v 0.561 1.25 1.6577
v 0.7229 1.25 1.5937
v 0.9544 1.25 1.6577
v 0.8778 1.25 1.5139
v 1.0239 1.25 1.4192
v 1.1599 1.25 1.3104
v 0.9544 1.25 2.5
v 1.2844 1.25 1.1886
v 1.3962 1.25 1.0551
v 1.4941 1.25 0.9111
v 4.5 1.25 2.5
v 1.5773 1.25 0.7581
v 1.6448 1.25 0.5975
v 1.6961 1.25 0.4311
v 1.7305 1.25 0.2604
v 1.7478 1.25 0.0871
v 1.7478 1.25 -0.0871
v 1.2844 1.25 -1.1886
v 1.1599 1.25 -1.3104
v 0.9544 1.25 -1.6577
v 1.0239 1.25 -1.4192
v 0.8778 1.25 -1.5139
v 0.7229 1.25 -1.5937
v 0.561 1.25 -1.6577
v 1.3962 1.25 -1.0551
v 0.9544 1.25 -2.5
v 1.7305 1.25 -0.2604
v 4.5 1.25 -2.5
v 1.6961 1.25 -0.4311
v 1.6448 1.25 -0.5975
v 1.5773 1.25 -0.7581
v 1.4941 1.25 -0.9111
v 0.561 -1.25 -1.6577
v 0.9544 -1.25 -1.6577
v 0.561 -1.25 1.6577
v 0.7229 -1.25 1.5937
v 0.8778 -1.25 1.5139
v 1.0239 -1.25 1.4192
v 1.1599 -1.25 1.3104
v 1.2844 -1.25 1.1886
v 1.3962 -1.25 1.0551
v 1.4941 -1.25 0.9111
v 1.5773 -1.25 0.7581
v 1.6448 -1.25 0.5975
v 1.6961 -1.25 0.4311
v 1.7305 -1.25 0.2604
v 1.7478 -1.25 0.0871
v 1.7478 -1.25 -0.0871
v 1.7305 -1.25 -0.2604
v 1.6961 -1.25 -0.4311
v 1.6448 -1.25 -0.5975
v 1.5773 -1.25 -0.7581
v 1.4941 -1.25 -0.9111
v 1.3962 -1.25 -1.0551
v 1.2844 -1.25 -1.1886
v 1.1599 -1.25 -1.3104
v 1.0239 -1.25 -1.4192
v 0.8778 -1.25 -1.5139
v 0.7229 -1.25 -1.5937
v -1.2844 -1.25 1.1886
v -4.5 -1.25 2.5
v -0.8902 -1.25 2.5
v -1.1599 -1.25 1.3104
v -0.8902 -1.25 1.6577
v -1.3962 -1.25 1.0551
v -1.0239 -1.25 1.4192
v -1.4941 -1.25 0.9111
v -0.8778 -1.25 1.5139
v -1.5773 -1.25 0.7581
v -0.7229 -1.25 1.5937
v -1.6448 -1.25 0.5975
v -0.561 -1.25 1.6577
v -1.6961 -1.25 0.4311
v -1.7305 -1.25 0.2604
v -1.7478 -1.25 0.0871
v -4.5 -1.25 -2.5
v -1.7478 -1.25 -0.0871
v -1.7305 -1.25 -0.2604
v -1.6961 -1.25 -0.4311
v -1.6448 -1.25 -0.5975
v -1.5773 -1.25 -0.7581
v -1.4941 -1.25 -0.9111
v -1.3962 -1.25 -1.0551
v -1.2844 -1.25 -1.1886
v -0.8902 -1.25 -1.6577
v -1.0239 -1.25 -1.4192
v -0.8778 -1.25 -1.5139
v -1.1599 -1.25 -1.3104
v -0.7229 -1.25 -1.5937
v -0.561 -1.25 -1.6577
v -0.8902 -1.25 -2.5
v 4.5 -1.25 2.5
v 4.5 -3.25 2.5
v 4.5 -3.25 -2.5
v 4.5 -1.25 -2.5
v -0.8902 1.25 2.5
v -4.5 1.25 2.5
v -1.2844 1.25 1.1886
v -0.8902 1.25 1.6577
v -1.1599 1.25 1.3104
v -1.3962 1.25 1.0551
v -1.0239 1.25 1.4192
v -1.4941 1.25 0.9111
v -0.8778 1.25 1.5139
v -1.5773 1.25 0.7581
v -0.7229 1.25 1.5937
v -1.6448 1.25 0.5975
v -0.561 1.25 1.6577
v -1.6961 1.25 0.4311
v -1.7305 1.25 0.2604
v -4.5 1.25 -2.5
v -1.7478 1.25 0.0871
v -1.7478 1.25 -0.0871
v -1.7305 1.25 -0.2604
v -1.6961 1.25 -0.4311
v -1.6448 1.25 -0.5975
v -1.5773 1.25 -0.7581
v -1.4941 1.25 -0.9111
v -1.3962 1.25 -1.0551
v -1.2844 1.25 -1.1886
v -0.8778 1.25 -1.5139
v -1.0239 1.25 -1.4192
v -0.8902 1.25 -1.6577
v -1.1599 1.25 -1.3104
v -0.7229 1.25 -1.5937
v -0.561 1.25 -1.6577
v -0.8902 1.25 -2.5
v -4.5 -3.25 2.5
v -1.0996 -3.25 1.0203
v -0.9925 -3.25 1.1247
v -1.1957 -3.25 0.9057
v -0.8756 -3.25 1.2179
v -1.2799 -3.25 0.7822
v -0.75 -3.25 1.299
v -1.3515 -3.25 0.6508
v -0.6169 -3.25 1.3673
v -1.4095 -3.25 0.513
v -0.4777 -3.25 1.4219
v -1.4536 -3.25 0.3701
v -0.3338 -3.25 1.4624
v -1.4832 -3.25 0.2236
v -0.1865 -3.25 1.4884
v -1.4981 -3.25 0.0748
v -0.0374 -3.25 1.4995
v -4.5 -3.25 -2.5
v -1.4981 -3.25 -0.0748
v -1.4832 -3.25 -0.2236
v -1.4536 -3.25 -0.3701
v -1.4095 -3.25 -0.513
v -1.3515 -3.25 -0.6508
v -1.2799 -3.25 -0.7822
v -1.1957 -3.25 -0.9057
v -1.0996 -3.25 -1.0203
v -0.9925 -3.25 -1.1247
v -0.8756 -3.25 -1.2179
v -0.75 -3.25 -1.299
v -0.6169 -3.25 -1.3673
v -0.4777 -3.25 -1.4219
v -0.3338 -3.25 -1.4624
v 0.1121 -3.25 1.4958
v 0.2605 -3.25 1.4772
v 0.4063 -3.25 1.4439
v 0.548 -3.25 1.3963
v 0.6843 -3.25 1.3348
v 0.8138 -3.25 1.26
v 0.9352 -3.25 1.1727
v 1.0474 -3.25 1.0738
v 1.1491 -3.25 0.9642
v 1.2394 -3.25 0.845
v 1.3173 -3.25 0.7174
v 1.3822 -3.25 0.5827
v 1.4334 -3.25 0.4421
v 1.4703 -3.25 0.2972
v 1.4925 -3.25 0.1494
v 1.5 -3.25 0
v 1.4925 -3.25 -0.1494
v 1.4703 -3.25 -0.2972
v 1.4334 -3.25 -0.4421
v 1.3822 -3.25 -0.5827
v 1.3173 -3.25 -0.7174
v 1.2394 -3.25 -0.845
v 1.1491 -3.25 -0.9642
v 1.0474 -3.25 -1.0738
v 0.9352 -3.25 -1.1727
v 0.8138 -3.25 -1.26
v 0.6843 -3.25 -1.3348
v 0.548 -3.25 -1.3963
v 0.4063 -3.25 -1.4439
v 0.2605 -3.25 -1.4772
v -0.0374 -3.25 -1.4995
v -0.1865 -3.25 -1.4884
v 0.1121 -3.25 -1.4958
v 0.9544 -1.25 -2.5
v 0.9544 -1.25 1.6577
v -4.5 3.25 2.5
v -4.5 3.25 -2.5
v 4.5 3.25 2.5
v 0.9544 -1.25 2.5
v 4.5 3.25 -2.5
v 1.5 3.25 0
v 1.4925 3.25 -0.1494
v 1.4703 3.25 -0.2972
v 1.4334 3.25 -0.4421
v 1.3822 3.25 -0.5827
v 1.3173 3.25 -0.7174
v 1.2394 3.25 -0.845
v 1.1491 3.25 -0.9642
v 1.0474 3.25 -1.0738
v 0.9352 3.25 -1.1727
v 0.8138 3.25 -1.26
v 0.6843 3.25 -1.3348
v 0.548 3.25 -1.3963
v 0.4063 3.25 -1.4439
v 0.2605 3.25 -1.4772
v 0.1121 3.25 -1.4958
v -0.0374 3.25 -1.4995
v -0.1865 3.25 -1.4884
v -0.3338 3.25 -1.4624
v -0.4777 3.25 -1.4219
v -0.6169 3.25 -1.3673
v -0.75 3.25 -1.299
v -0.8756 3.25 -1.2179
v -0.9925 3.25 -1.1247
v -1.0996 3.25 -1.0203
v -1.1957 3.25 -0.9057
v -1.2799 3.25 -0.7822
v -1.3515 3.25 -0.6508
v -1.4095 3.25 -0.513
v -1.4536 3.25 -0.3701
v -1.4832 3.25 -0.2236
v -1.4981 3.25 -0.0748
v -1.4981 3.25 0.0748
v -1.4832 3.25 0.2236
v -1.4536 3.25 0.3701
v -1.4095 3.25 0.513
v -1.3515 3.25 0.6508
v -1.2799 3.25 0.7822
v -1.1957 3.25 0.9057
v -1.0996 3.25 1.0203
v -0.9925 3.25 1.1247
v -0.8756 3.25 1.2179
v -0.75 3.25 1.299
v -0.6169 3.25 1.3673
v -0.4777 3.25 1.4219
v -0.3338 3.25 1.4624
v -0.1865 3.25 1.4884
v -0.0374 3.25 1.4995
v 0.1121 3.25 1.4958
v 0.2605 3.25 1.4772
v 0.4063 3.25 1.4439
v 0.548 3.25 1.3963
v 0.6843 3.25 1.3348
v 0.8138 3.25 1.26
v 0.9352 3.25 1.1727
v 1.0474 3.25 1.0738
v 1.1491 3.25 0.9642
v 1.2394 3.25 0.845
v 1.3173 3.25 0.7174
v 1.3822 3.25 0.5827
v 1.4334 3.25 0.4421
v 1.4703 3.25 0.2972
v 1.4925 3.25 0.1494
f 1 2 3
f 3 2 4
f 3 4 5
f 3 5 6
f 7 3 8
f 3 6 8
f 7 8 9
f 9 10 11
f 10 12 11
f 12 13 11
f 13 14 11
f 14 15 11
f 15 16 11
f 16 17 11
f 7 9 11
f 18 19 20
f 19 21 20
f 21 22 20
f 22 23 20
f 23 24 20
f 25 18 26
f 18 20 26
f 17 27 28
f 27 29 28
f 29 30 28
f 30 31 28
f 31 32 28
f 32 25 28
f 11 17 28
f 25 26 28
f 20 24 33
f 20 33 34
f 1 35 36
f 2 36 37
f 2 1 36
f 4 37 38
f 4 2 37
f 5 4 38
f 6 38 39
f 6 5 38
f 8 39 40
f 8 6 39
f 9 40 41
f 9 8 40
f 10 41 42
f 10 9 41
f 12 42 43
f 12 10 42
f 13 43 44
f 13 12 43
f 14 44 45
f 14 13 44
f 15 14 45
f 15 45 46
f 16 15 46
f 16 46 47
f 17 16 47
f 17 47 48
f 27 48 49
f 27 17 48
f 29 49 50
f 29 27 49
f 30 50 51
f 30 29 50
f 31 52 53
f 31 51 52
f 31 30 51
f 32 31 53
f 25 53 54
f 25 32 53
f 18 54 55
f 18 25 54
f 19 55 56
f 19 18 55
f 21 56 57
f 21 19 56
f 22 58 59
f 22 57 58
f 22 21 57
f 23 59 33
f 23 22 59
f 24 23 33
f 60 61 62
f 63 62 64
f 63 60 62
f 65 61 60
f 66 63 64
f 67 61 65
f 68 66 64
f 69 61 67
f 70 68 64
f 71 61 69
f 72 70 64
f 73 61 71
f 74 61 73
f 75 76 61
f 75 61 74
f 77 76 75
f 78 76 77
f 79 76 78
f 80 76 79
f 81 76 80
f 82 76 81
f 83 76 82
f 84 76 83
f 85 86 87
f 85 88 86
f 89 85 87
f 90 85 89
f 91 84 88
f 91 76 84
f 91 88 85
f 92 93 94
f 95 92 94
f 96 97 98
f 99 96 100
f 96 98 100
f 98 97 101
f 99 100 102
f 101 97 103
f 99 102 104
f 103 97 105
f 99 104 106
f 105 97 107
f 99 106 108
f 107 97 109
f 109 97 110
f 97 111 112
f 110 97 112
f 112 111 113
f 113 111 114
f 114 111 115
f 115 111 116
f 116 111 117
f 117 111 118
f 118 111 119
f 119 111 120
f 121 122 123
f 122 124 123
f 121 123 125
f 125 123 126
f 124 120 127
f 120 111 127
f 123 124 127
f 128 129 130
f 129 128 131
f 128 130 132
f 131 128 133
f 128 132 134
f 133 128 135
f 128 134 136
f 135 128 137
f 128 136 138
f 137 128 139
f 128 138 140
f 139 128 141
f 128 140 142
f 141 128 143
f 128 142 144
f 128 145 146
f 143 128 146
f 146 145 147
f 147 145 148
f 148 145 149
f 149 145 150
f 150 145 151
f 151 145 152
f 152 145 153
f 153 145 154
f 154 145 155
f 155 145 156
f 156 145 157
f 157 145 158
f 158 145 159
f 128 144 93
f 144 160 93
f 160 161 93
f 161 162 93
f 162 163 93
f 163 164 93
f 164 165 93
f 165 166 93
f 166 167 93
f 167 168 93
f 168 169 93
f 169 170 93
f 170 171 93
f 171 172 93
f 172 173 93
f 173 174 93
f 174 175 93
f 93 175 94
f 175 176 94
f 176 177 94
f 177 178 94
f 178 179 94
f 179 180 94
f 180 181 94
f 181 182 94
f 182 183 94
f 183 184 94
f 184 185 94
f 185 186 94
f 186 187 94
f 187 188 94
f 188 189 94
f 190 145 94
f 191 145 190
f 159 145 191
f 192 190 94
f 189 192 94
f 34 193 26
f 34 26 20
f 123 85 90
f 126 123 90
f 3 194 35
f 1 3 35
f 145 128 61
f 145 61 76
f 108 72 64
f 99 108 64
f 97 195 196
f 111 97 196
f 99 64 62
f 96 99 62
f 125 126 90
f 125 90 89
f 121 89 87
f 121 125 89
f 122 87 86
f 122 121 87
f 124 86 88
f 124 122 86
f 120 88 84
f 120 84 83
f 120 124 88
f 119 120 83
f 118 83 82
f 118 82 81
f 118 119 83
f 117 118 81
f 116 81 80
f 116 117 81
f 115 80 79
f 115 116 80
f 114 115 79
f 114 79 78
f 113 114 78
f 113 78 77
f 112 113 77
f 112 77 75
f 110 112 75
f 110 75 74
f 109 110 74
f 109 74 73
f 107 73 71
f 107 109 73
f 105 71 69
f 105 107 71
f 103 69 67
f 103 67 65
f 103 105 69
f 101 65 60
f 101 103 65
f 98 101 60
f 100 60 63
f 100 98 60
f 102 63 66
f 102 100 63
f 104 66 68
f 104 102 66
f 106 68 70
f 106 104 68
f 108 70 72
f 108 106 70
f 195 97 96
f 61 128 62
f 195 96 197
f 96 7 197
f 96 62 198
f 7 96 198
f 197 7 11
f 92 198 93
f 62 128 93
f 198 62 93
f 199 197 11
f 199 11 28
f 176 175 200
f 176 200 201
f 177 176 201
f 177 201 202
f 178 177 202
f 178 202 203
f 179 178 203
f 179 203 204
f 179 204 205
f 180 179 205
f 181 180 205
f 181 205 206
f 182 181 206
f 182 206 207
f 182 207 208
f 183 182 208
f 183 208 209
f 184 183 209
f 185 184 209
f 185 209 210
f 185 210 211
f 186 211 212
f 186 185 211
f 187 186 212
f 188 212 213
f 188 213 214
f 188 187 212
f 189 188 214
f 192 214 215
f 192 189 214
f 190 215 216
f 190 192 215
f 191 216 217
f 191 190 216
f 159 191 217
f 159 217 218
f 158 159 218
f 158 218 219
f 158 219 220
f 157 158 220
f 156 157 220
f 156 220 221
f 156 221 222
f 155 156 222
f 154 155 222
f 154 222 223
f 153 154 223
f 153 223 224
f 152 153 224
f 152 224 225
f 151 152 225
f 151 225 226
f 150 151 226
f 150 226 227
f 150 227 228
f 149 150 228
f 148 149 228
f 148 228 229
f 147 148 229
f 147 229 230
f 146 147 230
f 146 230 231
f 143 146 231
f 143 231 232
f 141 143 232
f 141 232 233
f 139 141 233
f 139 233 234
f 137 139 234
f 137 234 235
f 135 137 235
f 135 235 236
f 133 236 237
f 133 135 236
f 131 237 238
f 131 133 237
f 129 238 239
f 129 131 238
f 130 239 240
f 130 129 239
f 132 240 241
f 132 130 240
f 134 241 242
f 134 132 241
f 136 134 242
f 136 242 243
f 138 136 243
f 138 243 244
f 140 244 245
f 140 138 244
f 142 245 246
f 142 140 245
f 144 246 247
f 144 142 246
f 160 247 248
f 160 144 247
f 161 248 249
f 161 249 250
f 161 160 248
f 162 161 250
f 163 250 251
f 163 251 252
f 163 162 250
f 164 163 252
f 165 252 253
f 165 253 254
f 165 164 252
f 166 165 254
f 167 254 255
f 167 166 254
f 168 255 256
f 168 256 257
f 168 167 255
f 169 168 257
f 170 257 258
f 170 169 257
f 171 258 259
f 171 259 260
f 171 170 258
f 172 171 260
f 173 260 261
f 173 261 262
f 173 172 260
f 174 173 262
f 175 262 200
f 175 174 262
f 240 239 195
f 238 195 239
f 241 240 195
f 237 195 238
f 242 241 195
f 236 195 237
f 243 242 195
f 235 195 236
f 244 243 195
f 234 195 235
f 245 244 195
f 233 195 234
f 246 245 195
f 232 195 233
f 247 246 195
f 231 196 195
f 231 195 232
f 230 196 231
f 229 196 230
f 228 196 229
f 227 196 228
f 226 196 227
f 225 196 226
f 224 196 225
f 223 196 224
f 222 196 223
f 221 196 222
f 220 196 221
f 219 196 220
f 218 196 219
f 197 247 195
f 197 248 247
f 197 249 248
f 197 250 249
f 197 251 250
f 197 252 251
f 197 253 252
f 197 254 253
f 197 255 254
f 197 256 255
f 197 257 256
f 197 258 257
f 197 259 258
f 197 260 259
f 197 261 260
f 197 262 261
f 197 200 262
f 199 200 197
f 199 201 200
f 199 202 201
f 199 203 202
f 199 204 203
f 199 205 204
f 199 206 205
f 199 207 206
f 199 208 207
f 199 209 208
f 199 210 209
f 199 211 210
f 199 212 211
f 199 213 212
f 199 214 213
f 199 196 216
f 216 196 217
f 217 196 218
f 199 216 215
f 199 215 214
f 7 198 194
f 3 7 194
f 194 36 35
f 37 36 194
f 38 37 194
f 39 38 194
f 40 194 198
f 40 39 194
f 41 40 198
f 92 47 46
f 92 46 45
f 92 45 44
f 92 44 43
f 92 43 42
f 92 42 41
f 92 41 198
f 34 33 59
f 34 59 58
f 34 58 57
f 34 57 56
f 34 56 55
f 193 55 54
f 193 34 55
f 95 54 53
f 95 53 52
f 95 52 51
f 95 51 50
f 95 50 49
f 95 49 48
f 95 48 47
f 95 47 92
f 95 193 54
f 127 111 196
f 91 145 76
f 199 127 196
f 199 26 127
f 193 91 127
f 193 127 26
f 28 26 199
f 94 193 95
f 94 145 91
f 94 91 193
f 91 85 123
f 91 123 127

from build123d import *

# Parameters (mm, degrees)
SKETCH1_R           = 1.75
SKETCH1_R_2         = 1.5
BOSS_EXTRUDE1_DEPTH = 3.25
SKETCH2_W           = 9
SKETCH2_H           = 5
SKETCH2_R           = 1.5
BOSS_EXTRUDE2_DEPTH = 2
BOSS_EXTRUDE3_DEPTH = 2.5


with BuildPart() as part:
    # Sketch1 → Boss-Extrude1 (new body, symmetric)
    with BuildSketch(Plane(origin=(0, 0, 0), x_dir=(1, 0, 0), z_dir=(0, 1, 0))):
        Circle(SKETCH1_R)
        Circle(SKETCH1_R_2, mode=Mode.SUBTRACT)
    extrude(amount=BOSS_EXTRUDE1_DEPTH, both=True)

    # Sketch2 → Boss-Extrude2 (add)
    with BuildSketch(Plane(origin=(0, 3.25, 0), x_dir=(1, 0, 0), z_dir=(0, 1, 0))):
        Rectangle(SKETCH2_W, SKETCH2_H)
        Circle(SKETCH2_R, mode=Mode.SUBTRACT)
    boss_extrude2 = extrude(amount=-BOSS_EXTRUDE2_DEPTH)

    # Mirror1: Boss-Extrude2 across plane
    add(boss_extrude2.mirror(Plane.ZX))

    # Sketch3 → Boss-Extrude3 (add)
    with BuildSketch(Plane(origin=(0, -1.25, 0), x_dir=(1, 0, 0), z_dir=(0, 1, 0))):
        Polygon((0, 1.657655202), (-0.890187657, 1.657655202), (-0.890187657, 2.5), (0.95442496, 2.5), (0.95442496, 1.657655202), align=None)
        Polygon((0.95442496, -1.657655202), (0, -1.657655202), (-0.890187657, -1.657655202), (-0.890187657, -2.5), (0.95442496, -2.5), align=None)
    extrude(amount=BOSS_EXTRUDE3_DEPTH)


solid = part.part
